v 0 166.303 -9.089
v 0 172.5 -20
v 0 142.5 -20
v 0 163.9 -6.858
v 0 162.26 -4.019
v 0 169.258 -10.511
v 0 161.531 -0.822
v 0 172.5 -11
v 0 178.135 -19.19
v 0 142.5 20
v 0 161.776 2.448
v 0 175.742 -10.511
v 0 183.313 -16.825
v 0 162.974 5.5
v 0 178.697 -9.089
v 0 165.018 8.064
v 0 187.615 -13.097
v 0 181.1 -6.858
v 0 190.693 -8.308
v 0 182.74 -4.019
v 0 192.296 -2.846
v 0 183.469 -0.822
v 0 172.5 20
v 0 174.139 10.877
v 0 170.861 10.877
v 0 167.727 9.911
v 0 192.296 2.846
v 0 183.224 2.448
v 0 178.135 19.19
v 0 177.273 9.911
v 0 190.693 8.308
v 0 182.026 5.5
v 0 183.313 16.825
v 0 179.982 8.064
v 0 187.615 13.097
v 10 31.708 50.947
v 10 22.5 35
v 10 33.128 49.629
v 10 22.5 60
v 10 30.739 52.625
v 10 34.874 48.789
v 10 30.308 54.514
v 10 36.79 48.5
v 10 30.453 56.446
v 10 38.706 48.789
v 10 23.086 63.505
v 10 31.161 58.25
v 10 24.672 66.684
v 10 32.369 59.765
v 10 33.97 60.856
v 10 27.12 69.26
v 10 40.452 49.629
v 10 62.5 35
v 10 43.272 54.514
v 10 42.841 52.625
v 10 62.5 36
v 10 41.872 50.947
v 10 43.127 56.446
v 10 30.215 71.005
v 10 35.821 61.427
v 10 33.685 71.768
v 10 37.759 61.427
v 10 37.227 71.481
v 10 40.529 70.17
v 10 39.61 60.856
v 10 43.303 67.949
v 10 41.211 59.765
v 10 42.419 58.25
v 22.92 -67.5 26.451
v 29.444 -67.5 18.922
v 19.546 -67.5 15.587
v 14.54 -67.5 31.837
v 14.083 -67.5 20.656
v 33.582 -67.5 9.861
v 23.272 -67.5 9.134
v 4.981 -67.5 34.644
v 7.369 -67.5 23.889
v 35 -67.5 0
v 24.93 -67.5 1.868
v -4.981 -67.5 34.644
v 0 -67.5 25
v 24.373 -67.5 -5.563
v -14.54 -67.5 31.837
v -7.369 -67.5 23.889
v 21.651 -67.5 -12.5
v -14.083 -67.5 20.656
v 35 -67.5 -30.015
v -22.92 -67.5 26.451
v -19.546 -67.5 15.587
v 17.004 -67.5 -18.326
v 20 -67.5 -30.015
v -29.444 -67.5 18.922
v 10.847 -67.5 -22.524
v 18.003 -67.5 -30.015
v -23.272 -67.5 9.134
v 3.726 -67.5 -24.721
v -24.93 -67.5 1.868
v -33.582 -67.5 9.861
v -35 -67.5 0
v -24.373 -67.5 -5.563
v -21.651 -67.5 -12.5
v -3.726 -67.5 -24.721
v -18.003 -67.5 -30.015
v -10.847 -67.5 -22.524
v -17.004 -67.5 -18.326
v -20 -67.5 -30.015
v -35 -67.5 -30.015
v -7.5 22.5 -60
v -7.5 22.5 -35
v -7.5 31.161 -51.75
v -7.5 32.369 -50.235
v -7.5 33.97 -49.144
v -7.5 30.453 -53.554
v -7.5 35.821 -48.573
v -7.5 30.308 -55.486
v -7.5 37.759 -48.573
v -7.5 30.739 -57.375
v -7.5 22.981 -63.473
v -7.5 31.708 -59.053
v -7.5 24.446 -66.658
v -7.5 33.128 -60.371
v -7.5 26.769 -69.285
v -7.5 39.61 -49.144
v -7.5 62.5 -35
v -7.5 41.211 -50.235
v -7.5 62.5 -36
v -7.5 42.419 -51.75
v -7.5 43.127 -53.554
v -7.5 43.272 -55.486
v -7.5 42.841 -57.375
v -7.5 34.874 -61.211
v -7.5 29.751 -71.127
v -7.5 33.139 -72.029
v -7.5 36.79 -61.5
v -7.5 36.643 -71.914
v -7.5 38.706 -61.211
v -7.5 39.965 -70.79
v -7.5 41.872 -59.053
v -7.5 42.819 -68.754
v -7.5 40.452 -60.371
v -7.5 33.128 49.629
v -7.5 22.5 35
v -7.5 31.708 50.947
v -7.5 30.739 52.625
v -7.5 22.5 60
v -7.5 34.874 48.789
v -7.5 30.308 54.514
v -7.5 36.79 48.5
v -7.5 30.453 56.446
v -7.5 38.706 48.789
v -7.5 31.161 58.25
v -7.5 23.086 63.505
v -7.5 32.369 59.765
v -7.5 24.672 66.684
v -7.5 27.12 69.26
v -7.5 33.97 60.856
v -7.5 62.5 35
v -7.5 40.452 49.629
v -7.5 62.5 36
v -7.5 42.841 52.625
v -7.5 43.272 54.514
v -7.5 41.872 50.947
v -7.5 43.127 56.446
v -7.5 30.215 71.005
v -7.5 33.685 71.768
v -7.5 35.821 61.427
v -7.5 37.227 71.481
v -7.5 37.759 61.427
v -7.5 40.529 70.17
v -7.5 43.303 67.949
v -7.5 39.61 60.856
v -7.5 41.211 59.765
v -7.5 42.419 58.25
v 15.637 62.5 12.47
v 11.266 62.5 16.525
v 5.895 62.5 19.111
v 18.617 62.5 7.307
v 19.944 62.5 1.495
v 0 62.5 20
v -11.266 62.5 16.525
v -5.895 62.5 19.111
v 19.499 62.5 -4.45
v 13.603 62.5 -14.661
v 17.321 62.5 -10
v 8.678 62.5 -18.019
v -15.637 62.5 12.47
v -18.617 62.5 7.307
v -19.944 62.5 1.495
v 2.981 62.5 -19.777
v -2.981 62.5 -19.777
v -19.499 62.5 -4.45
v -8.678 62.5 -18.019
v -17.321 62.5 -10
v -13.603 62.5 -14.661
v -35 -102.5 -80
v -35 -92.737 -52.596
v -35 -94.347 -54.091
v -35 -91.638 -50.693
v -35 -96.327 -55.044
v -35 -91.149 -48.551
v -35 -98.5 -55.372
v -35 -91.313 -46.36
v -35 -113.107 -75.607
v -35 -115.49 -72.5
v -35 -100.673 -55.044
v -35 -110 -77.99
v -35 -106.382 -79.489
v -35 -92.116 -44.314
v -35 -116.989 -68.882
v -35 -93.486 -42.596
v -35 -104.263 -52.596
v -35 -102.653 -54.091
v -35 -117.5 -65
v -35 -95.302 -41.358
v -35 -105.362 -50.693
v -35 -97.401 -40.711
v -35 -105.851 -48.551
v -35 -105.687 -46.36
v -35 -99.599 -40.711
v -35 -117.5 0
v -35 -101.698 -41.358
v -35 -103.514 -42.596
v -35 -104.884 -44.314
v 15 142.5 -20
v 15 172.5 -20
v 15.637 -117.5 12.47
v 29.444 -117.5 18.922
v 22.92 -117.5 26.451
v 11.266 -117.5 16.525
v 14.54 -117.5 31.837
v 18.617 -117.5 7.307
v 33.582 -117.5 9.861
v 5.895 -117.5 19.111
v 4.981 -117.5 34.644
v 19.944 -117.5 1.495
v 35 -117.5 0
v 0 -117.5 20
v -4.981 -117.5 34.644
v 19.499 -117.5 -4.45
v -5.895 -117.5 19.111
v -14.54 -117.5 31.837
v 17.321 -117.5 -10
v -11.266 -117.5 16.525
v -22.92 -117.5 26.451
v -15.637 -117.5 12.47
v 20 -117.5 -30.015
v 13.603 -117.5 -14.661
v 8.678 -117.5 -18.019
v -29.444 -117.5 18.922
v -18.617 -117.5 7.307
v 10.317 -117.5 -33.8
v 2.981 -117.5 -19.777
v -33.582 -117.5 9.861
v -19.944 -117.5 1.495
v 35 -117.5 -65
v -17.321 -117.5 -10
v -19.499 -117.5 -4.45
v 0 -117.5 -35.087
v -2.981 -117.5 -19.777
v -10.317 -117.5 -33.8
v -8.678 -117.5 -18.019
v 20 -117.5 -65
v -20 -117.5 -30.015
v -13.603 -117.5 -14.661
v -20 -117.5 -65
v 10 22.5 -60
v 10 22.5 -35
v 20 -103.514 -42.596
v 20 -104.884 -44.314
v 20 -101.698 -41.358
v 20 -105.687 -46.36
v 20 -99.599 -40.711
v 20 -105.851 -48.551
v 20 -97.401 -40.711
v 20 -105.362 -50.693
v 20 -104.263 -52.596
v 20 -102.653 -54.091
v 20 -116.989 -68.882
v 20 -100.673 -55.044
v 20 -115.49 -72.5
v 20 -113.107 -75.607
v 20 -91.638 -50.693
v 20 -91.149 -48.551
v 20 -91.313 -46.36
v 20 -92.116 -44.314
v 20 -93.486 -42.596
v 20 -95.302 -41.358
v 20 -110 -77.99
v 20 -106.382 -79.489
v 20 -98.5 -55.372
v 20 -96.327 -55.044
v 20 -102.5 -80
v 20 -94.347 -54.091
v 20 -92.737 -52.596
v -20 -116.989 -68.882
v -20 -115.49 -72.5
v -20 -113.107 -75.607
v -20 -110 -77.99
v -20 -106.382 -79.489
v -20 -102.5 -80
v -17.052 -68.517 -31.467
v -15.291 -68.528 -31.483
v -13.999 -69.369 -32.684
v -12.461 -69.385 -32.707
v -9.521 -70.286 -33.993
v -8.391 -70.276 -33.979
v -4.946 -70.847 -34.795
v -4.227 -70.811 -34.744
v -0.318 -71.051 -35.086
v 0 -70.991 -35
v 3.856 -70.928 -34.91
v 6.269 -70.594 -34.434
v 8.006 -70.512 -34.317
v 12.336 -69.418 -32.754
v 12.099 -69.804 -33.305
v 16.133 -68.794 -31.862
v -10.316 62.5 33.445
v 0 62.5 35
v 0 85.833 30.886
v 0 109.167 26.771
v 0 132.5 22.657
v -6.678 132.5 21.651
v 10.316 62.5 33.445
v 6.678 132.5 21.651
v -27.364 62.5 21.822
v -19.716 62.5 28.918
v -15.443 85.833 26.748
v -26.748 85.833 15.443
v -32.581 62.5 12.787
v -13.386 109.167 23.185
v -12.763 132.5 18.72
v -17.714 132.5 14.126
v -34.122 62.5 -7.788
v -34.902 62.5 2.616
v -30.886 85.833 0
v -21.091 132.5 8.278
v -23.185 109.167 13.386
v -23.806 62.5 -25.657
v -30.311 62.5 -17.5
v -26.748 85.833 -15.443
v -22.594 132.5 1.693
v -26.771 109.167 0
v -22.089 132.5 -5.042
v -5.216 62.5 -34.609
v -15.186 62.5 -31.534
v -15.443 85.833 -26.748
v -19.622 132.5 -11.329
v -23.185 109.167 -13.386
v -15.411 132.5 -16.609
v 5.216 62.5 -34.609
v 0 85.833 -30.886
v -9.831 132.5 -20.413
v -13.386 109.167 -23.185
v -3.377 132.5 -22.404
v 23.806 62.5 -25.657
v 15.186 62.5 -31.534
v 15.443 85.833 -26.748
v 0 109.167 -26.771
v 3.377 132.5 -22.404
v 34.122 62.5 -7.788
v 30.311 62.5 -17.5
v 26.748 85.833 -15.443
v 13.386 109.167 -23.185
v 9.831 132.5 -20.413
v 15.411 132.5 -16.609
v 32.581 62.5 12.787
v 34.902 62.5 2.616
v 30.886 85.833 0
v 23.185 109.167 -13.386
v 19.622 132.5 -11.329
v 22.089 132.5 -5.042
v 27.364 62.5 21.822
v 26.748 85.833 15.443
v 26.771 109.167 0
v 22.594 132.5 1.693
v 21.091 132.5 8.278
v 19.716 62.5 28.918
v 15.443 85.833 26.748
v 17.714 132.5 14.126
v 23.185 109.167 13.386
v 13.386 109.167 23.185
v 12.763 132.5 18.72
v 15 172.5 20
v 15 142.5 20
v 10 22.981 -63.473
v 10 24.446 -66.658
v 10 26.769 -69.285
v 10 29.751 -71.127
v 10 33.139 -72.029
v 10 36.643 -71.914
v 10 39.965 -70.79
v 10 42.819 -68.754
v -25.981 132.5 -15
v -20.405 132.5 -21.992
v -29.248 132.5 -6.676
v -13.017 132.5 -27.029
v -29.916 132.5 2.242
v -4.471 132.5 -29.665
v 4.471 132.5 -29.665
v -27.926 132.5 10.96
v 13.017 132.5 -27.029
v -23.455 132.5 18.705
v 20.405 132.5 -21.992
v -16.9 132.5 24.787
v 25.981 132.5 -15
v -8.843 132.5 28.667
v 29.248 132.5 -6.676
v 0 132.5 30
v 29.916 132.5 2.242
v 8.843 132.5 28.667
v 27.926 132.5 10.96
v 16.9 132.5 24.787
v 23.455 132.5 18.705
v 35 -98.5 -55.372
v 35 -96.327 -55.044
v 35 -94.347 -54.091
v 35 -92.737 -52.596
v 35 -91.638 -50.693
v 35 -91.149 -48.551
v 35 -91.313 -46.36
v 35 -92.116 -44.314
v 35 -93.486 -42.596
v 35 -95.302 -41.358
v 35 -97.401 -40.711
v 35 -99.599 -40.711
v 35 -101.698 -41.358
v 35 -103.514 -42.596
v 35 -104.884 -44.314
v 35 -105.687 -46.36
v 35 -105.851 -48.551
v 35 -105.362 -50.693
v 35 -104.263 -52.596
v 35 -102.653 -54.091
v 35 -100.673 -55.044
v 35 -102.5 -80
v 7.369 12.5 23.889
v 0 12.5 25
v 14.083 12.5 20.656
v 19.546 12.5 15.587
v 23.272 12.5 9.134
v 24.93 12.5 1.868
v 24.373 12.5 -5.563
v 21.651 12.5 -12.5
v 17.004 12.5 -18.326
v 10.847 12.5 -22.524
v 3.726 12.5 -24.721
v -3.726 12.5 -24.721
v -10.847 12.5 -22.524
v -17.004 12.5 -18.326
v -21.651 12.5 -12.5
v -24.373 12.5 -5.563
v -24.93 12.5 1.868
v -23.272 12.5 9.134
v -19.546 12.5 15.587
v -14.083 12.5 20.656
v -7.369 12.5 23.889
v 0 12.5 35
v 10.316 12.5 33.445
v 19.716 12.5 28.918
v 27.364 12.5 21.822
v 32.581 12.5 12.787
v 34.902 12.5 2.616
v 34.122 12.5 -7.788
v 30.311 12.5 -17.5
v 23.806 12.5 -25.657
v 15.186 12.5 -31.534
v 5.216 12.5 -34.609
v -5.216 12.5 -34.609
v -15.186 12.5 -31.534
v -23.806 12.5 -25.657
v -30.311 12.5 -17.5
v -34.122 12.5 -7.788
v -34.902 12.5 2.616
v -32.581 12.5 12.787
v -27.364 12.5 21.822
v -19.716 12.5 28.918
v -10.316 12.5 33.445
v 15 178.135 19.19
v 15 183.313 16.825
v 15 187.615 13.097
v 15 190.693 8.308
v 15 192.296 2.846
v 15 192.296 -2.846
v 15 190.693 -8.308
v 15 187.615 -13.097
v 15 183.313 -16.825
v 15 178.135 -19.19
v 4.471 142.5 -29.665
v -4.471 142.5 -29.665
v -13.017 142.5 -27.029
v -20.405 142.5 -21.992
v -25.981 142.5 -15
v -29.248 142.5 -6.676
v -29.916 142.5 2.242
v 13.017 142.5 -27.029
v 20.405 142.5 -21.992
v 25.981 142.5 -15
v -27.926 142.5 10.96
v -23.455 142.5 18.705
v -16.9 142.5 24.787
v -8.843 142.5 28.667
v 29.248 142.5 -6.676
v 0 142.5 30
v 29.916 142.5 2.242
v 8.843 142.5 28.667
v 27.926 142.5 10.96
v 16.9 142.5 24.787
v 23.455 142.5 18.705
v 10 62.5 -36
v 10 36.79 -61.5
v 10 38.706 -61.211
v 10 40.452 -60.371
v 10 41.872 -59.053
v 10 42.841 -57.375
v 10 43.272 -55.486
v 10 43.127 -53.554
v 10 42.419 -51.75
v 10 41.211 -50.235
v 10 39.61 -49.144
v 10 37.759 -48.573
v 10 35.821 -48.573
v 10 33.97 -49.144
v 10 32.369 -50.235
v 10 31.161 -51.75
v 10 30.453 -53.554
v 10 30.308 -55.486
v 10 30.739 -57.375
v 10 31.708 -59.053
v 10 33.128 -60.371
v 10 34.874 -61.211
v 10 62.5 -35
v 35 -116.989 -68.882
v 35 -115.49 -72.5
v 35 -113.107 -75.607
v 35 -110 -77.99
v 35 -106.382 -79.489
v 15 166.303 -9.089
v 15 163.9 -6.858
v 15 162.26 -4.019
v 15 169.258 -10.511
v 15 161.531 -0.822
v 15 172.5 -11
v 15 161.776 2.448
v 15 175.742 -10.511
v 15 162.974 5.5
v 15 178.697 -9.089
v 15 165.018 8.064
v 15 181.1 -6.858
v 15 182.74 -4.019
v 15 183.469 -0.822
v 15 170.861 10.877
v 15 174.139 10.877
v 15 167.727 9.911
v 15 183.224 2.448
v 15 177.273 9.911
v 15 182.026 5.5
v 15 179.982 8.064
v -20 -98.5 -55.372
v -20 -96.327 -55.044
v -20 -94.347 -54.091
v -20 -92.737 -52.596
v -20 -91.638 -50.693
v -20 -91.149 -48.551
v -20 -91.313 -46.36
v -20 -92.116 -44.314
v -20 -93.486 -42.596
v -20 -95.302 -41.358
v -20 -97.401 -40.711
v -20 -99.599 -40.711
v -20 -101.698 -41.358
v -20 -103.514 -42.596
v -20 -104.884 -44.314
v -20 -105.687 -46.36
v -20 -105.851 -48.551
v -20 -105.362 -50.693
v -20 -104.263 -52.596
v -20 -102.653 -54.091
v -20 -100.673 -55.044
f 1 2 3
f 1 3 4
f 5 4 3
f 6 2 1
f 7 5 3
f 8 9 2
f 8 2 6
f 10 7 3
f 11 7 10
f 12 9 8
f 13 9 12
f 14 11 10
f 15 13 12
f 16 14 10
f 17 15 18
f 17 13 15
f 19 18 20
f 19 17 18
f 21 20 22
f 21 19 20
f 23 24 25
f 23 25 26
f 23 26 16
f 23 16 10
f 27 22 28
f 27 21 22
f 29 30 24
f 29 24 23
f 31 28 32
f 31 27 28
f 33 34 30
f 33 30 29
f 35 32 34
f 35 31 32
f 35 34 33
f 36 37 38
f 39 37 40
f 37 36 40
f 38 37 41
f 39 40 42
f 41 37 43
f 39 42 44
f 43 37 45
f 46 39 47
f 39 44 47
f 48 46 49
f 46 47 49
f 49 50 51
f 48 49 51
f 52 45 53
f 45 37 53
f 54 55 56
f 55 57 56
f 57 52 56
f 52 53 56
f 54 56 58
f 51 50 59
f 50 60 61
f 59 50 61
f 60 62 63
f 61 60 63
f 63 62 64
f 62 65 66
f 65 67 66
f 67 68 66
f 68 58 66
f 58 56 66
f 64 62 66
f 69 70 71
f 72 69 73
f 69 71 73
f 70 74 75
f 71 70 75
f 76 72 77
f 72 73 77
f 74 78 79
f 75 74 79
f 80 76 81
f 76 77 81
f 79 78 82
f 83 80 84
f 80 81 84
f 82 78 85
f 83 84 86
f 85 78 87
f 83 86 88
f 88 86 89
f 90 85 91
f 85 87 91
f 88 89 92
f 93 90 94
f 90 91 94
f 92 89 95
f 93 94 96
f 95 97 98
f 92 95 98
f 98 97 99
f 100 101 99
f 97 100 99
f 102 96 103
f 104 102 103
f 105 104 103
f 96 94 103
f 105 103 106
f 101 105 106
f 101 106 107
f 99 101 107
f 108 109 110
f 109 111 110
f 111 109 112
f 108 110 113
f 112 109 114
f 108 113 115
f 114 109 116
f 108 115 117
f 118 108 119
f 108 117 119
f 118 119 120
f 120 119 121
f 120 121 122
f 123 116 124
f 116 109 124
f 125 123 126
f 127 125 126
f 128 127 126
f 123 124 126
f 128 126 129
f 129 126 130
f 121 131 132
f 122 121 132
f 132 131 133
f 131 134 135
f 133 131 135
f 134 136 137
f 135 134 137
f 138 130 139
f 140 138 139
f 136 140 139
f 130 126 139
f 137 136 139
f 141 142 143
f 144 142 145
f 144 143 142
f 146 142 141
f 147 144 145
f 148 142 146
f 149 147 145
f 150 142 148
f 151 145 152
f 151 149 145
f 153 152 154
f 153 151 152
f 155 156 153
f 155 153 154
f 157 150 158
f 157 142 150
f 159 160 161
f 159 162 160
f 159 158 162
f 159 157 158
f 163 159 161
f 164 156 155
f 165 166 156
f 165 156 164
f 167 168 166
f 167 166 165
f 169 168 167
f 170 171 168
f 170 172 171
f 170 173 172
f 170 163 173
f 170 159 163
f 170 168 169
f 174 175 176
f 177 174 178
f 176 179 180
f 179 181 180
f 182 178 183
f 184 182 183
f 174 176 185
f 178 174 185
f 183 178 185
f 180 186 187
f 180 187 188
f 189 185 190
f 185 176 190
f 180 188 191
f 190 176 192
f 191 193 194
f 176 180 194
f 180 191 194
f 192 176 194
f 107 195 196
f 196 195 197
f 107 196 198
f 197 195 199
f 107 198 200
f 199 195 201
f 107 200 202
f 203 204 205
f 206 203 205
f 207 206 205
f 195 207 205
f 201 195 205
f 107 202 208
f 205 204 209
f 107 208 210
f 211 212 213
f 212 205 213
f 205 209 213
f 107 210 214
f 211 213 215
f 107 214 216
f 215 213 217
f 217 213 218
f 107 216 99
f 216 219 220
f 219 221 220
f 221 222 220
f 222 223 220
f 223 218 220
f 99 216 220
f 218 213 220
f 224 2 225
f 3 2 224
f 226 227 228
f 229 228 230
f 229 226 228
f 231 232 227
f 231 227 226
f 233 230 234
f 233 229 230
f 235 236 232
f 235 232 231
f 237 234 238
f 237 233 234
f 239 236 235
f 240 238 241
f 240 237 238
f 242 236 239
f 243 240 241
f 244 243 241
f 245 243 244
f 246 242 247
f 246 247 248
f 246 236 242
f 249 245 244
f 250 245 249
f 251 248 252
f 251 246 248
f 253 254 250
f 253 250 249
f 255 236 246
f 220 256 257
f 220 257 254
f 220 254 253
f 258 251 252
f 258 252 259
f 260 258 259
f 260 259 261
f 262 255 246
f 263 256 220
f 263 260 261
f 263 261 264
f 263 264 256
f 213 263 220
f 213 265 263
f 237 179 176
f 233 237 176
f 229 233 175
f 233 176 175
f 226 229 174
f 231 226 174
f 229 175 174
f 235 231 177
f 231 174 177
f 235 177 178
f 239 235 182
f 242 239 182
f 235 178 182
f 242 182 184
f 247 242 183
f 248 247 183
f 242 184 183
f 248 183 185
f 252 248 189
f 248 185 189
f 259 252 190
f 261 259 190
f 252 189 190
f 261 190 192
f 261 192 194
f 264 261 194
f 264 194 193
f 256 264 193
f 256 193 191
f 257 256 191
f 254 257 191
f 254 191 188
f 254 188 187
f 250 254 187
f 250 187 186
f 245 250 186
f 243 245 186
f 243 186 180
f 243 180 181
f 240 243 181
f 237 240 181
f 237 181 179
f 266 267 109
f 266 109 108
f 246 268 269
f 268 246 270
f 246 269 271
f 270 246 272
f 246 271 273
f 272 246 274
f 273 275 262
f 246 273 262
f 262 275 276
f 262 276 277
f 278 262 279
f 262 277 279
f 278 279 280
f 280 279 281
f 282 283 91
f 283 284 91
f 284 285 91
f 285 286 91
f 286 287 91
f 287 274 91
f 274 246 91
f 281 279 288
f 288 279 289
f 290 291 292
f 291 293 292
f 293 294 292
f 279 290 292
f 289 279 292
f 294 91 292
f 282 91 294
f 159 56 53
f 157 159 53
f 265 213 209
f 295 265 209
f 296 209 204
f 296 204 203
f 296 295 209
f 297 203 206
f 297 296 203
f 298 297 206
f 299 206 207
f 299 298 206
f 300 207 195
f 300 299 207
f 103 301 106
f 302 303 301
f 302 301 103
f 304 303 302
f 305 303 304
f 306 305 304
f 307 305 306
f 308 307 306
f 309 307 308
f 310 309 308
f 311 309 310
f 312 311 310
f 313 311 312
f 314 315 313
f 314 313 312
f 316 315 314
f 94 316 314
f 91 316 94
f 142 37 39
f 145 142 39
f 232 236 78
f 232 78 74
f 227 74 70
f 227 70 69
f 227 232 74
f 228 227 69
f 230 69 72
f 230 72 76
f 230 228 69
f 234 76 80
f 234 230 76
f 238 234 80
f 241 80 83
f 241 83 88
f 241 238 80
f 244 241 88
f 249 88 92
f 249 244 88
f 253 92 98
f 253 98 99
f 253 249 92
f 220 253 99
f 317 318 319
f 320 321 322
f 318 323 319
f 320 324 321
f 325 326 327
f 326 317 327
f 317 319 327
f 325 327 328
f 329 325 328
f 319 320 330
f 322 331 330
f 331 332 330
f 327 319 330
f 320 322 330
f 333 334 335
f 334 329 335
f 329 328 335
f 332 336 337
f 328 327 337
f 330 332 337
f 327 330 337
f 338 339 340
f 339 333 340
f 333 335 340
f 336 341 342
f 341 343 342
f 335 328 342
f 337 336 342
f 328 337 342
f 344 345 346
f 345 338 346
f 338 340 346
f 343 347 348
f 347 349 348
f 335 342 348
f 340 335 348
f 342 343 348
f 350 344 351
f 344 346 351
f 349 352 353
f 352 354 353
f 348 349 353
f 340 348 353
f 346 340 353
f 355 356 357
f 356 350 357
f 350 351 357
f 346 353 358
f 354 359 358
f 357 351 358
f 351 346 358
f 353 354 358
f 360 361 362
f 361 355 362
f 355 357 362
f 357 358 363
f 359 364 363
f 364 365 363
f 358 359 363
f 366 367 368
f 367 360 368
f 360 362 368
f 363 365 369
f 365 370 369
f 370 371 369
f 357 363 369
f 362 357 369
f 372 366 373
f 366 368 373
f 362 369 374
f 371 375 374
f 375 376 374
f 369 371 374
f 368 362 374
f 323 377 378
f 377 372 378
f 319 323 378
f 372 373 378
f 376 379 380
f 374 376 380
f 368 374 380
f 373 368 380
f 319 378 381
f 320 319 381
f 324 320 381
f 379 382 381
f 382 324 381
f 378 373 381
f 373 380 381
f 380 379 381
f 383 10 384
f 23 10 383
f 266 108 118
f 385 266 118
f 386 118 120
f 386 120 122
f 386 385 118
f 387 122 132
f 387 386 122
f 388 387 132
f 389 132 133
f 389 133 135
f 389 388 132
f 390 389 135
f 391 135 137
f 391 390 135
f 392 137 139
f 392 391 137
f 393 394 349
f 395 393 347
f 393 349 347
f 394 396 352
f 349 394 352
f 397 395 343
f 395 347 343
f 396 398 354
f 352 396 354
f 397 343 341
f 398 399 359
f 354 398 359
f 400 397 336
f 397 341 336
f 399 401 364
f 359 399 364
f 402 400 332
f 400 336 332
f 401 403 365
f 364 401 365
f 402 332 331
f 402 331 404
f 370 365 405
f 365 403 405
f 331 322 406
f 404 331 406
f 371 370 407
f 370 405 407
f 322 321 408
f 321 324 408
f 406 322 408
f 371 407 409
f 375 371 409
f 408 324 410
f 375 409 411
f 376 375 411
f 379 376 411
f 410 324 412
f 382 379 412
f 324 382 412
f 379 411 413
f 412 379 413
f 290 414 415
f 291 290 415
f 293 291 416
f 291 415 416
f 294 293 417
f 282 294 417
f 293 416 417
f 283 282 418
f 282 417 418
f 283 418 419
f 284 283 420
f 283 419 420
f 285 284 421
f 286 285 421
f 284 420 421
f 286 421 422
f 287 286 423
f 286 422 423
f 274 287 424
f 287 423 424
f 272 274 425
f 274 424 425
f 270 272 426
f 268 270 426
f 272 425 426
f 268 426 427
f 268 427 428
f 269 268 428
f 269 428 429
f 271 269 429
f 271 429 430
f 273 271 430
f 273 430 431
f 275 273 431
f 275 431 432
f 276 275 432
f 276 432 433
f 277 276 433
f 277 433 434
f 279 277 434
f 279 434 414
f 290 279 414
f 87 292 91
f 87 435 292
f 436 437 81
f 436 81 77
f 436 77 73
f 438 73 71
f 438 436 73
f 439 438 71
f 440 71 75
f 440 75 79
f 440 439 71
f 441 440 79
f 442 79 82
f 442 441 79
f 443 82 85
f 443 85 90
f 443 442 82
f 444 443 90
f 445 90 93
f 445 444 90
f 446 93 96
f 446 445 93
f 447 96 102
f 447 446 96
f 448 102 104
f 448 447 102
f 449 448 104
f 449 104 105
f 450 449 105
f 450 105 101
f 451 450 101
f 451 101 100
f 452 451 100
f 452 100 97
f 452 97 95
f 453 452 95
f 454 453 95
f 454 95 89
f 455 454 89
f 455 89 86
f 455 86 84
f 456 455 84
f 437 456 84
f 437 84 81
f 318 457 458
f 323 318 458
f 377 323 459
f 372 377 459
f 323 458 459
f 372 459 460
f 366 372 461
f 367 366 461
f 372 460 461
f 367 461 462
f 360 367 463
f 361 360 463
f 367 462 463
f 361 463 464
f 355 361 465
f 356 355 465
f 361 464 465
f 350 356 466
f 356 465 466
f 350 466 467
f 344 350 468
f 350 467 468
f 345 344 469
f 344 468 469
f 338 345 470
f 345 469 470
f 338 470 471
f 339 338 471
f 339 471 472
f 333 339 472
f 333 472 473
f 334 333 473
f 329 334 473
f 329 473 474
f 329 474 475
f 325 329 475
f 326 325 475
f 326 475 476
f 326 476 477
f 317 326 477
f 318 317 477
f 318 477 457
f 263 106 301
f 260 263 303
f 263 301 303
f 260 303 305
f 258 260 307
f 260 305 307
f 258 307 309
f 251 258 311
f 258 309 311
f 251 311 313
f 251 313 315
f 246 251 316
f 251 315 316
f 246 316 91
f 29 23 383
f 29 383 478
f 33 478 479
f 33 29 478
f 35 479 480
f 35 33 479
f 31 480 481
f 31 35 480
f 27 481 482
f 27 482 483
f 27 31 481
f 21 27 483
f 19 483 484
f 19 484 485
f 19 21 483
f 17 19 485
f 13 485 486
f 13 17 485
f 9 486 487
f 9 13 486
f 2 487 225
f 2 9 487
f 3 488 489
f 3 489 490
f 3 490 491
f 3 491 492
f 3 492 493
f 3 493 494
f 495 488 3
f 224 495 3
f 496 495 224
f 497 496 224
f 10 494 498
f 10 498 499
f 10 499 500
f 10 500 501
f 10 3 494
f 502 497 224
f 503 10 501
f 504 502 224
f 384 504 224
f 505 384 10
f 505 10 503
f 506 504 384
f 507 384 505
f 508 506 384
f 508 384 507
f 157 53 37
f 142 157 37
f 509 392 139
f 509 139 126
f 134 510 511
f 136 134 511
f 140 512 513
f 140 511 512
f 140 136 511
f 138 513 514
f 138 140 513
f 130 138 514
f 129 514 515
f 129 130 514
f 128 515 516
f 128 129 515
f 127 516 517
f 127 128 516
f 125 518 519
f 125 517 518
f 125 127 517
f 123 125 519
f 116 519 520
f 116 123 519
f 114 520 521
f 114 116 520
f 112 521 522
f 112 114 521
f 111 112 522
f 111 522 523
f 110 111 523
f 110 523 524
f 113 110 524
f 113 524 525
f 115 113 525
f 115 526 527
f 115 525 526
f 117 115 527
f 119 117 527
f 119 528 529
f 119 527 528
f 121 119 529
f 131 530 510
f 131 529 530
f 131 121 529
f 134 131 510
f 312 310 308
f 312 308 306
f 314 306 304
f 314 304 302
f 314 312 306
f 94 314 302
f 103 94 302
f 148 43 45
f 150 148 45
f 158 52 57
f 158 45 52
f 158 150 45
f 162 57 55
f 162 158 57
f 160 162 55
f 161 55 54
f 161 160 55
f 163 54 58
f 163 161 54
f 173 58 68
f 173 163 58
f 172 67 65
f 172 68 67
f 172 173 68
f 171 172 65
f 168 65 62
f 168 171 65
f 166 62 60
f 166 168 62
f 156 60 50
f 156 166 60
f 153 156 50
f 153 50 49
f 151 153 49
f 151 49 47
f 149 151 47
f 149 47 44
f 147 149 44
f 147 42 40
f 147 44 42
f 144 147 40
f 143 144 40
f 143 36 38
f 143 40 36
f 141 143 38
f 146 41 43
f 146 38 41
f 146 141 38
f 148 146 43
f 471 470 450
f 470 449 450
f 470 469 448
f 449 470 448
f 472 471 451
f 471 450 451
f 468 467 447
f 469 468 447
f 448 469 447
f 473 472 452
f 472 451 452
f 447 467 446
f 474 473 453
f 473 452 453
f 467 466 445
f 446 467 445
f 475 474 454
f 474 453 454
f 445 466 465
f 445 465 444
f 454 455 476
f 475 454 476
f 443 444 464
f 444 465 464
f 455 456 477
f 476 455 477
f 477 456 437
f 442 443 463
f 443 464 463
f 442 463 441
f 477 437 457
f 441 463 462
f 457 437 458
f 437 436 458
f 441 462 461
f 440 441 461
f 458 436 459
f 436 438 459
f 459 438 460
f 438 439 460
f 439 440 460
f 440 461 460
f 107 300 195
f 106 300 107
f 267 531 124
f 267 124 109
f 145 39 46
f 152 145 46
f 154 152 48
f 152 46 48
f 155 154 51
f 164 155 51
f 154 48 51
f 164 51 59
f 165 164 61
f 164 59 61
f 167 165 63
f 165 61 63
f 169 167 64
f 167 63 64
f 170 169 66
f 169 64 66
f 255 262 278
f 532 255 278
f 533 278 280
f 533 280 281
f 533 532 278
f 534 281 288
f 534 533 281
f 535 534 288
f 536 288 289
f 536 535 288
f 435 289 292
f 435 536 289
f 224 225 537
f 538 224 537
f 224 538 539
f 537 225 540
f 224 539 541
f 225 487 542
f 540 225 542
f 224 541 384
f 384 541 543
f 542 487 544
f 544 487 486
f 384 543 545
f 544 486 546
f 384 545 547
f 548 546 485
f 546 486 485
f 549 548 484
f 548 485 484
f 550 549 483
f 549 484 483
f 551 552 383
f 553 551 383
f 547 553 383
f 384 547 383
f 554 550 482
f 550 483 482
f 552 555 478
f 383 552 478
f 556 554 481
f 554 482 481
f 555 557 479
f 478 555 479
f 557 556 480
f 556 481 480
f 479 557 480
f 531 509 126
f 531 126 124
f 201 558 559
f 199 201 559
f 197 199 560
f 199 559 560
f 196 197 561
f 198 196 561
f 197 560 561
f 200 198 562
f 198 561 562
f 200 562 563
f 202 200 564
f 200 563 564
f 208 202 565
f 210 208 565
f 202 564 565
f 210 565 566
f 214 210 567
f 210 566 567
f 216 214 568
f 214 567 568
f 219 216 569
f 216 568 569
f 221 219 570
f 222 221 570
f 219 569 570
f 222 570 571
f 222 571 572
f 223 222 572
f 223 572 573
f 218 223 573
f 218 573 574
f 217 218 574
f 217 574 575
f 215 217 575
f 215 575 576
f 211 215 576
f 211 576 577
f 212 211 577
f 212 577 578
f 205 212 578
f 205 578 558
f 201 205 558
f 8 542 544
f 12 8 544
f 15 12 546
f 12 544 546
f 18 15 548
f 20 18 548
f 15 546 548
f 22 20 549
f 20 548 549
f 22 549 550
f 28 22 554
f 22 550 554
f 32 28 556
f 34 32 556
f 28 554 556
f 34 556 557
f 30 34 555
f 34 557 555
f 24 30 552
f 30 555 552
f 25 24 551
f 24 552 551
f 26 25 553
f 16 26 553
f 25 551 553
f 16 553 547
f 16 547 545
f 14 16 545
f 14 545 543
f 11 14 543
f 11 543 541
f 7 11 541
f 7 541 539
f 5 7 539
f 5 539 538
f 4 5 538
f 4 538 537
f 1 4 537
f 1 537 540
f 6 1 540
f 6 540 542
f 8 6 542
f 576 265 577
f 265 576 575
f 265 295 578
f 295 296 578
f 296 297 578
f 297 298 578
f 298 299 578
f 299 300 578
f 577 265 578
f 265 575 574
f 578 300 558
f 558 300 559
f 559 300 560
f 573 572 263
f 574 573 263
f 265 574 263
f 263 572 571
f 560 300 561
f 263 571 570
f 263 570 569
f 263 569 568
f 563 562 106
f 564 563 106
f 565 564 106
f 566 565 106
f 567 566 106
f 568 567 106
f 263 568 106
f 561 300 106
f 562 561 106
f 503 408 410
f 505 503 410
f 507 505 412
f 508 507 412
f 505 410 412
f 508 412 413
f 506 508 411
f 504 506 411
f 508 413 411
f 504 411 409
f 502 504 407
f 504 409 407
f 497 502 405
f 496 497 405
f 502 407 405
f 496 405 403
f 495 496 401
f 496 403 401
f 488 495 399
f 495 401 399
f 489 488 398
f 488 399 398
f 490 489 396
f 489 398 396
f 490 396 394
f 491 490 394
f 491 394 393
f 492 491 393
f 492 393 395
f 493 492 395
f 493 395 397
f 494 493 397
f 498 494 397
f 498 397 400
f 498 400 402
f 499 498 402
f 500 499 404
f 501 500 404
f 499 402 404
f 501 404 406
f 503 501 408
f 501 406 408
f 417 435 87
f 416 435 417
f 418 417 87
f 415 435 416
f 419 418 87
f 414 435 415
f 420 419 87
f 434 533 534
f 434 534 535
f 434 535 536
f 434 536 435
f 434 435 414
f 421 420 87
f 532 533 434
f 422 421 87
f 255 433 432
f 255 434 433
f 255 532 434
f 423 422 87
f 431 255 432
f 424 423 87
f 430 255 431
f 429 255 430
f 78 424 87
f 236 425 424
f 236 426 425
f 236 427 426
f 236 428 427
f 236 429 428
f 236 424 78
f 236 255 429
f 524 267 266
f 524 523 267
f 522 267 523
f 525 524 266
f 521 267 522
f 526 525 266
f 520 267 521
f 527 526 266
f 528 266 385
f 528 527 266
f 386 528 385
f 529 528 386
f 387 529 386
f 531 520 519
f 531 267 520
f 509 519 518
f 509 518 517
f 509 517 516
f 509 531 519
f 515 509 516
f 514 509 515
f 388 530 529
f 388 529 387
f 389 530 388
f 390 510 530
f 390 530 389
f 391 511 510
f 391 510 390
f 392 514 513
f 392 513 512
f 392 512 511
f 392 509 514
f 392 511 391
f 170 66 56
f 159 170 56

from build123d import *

# Parameters (mm, degrees)
SKETCH1_R                = 20
BOSS_EXTRUDE1_DEPTH      = 117.5
SKETCH2_R                = 35
BOSS_EXTRUDE2_DEPTH      = 50
SKETCH3_R                = 25
BOSS_EXTRUDE3_DEPTH      = 235
SKETCH1_3_R              = 20
CUT_EXTRUDE1_DEPTH       = 117.5
BOSS_EXTRUDE4_DEPTH      = 35
CUT_EXTRUDE2_DEPTH       = 80
BOSS_EXTRUDE5_START      = -50
BOSS_EXTRUDE5_DEPTH      = 50
BOSS_EXTRUDE6_START      = -50
BOSS_EXTRUDE6_DEPTH      = 50
CUT_EXTRUDE5_DEPTH       = 205.572725455
SKETCH12_R               = 7.371760232
CUT_EXTRUDE6_DEPTH       = 159.449518775
BOSS_EXTRUDE9_START      = -105
SKETCH16_R               = 35
BOSS_EXTRUDE9_DEPTH      = 105
CUT_EXTRUDE9_START       = -55
SKETCH18_R               = 35
CUT_EXTRUDE9_DEPTH       = 55
BOSS_EXTRUDE10_START     = 55
SKETCH19_R               = 25
BOSS_EXTRUDE10_DEPTH     = 55
SKETCH20_R               = 20
CUT_EXTRUDE10_DEPTH      = 251.699022734
SKETCH57_R               = 30
BOSS_EXTRUDE11_DEPTH     = 10
BOSS_EXTRUDE13_DEPTH     = 15
SKETCH59_R               = 11
CUT_EXTRUDE11_DEPTH      = 215.374088919
BOSS_EXTRUDE20_DEPTH     = 42.5
BOSS_EXTRUDE21_DEPTH     = 42.5
CUT_EXTRUDE12_DEPTH      = 25
CUT_EXTRUDE18_START      = -25
CUT_EXTRUDE18_DEPTH      = 25
SKETCH71_W               = 21.239894534
SKETCH71_H               = 33.551769162
CUT_EXTRUDE19_DEPTH      = 25
CUT_EXTRUDE20_DEPTH      = 214.26333487
CUT_EXTRUDE20_DEPTH_BACK = 214.26333487
SKETCH72_R               = 6.5


# Read off the part's stored shape, not the designer's step: Cut-Extrude18
with BuildPart() as part:
    # Sketch1 → Boss-Extrude1 (new, symmetric)
    with BuildSketch(Plane(origin=(0, 0, 0), x_dir=(1, 0, 0), z_dir=(0, 1, 0))):
        with Locations(Location((0, 0, 0), (0, 0, 90))):
            Circle(SKETCH1_R)
    extrude(amount=BOSS_EXTRUDE1_DEPTH, both=True)

    # Sketch2 → Boss-Extrude2 (add)
    with BuildSketch(Plane.XZ.offset(117.5)):
        with Locations(Location((0, 0, 0), (0, 0, 270))):
            Circle(SKETCH2_R)
    extrude(amount=-BOSS_EXTRUDE2_DEPTH)

    # Sketch3 → Boss-Extrude3 (add)
    with BuildSketch(Plane(origin=(0, 117.5, 0), x_dir=(1, 0, 0), z_dir=(0, 1, 0))):
        with Locations(Location((0, 0, 0), (0, 0, 270))):
            Circle(SKETCH3_R)
    extrude(amount=-BOSS_EXTRUDE3_DEPTH)

    # Sketch1<3> → Cut-Extrude1 (cut, symmetric)
    with BuildSketch(Plane(origin=(0, 0, 0), x_dir=(1, 0, 0), z_dir=(0, 1, 0))):
        with Locations(Location((0, 0, 0), (0, 0, 270))):
            Circle(SKETCH1_3_R)
    extrude(amount=CUT_EXTRUDE1_DEPTH, both=True, mode=Mode.SUBTRACT)

    # Sketch4 → Boss-Extrude4 (add, symmetric)
    with BuildSketch(Plane(origin=(0, 0, 0), x_dir=(0, 0, -1), z_dir=(1, 0, 0))):
        with BuildLine():
            Line((30.014819764, -67.5), (30.014819764, -117.5))
            Line((30.014819764, -117.5), (65, -117.5))
            ThreePointArc((65, -117.5), (75.606601718, -113.106601718), (80, -102.5))
            Line((80, -102.5), (30.014819764, -67.5))
        make_face()
    extrude(amount=BOSS_EXTRUDE4_DEPTH, both=True)

    # Sketch5 → Cut-Extrude2 (cut)
    with BuildSketch(Plane(origin=(35, 0, 0), x_dir=(0, 0, -1), z_dir=(1, 0, 0))):
        Polygon((30.014819764, -67.5), (35, -67.5), (35, -70.990660781), align=None)
    extrude(amount=-CUT_EXTRUDE2_DEPTH, mode=Mode.SUBTRACT)

    # Sketch6 → Boss-Extrude5 (add)
    with BuildSketch(Plane(origin=(0, -67.5, 0), x_dir=(1, 0, 0), z_dir=(0, 1, 0)).offset(BOSS_EXTRUDE5_START)):
        with BuildLine():
            Line((-35, 30.014819764), (-35, 0))
            ThreePointArc((-35, 0), (-30.455767215, 17.246629913), (-18.003071808, 30.014819764))
            Line((-18.003071808, 30.014819764), (-35, 30.014819764))
        make_face()
    extrude(amount=BOSS_EXTRUDE5_DEPTH)

    # Sketch7 → Boss-Extrude6 (add)
    with BuildSketch(Plane(origin=(0, -67.5, 0), x_dir=(1, 0, 0), z_dir=(0, 1, 0)).offset(BOSS_EXTRUDE6_START)):
        with BuildLine():
            Line((35, 30.014819764), (35, 0))
            ThreePointArc((35, 0), (30.455767215, 17.246629913), (18.003071808, 30.014819764))
            Line((18.003071808, 30.014819764), (35, 30.014819764))
        make_face()
    extrude(amount=BOSS_EXTRUDE6_DEPTH)

    # Sketch9 → Cut-Extrude5 (cut, through all)
    with BuildSketch(Plane(origin=(0, -67.5, 0), x_dir=(1, 0, 0), z_dir=(0, 1, 0))):
        with BuildLine():
            Line((0, 80), (-20, 80))
            Line((-20, 80), (-20, 30.014819764))
            ThreePointArc((-20, 30.014819764), (0, 35.08744218), (20, 30.014819764))
            Line((20, 30.014819764), (20, 80))
            Line((20, 80), (0, 80))
        make_face()
    extrude(amount=-CUT_EXTRUDE5_DEPTH, mode=Mode.SUBTRACT)

    # Sketch12 → Cut-Extrude6 (cut, through all)
    with BuildSketch(Plane(origin=(35, 0, 0), x_dir=(0, 0, -1), z_dir=(1, 0, 0))):
        with Locations((48, -98.5)):
            Circle(SKETCH12_R)
    extrude(amount=-CUT_EXTRUDE6_DEPTH, mode=Mode.SUBTRACT)

    # Sketch16 → Boss-Extrude9 (add)
    with BuildSketch(Plane(origin=(0, 117.5, 0), x_dir=(1, 0, 0), z_dir=(0, 1, 0)).offset(BOSS_EXTRUDE9_START)):
        with Locations(Location((0, 0, 0), (0, 0, 270))):
            Circle(SKETCH16_R)
    extrude(amount=BOSS_EXTRUDE9_DEPTH)

    # Sketch18 → Cut-Extrude9 (cut)
    with BuildSketch(Plane(origin=(0, 117.5, 0), x_dir=(1, 0, 0), z_dir=(0, 1, 0)).offset(CUT_EXTRUDE9_START)):
        with Locations(Location((0, 0, 0), (0, 0, 270))):
            Circle(SKETCH18_R)
    extrude(amount=CUT_EXTRUDE9_DEPTH, mode=Mode.SUBTRACT)

    # Sketch19 → Boss-Extrude10 (add)
    with BuildSketch(Plane(origin=(0, 62.5, 0), x_dir=(1, 0, 0), z_dir=(0, 1, 0)).offset(BOSS_EXTRUDE10_START)):
        with Locations(Location((0, 0, 0), (0, 0, 270))):
            Circle(SKETCH19_R)
    extrude(amount=-BOSS_EXTRUDE10_DEPTH)

    # Sketch20 → Cut-Extrude10 (cut, through all)
    with BuildSketch(Plane(origin=(0, 117.5, 0), x_dir=(1, 0, 0), z_dir=(0, 1, 0))):
        with Locations(Location((0, 0, 0), (0, 0, 270))):
            Circle(SKETCH20_R)
    extrude(amount=-CUT_EXTRUDE10_DEPTH, mode=Mode.SUBTRACT)

    # Sketch21 → Revolve1 (revolve)
    with BuildSketch(Plane(origin=(0, 0, 0), x_dir=(0, 0, -1), z_dir=(1, 0, 0))):
        Polygon((-35, 62.5), (-22.65711135, 132.5), (0, 132.5), (0, 62.5), align=None)
    revolve(axis=Axis((0, 132.5, 0), (0, -1, 0)))

    # Sketch57 → Boss-Extrude11 (add)
    with BuildSketch(Plane(origin=(0, 132.5, 0), x_dir=(1, 0, 0), z_dir=(0, 1, 0))):
        with Locations(Location((0, 0, 0), (0, 0, 270))):
            Circle(SKETCH57_R)
    extrude(amount=BOSS_EXTRUDE11_DEPTH)

    # Sketch58 → Boss-Extrude13 (add)
    with BuildSketch(Plane(origin=(0, 0, 0), x_dir=(0, 0, -1), z_dir=(1, 0, 0))):
        with BuildLine():
            Line((0, 142.5), (-20, 142.5))
            Line((-20, 142.5), (-20, 172.5))
            ThreePointArc((-20, 172.5), (0, 192.5), (20, 172.5))
            Line((20, 172.5), (20, 142.5))
            Line((20, 142.5), (0, 142.5))
        make_face()
    extrude(amount=BOSS_EXTRUDE13_DEPTH)

    # Sketch59 → Cut-Extrude11 (cut, through all)
    with BuildSketch(Plane(origin=(15, 0, 0), x_dir=(0, 0, -1), z_dir=(1, 0, 0))):
        with Locations((0, 172.5)):
            Circle(SKETCH59_R)
    extrude(amount=-CUT_EXTRUDE11_DEPTH, mode=Mode.SUBTRACT)


with BuildPart() as body_2:
    # Sketch61 → Boss-Extrude20 (new body)
    with BuildSketch(Plane(origin=(35, 0, 0), x_dir=(0, 0, -1), z_dir=(1, 0, 0))):
        with BuildLine():
            Line((-35, 22.5), (-60, 22.5))
            ThreePointArc((-60, 22.5), (-71.005339309, 30.215016925), (-67.94901172, 43.303097041))
            Line((-67.94901172, 43.303097041), (-36, 62.5))
            Line((-36, 62.5), (-35, 62.5))
            Line((-35, 62.5), (-35, 22.5))
        make_face()
    extrude(amount=-BOSS_EXTRUDE20_DEPTH)

    # Sketch66 → Cut-Extrude12 (cut)
    with BuildSketch(Plane(origin=(35, 0, 0), x_dir=(0, 0, -1), z_dir=(1, 0, 0))):
        with BuildLine():
            Line((-35, 22.5), (-60, 22.5))
            ThreePointArc((-60, 22.5), (-71.005339309, 30.215016925), (-67.94901172, 43.303097041))
            Line((-67.94901172, 43.303097041), (-36, 62.5))
            Line((-36, 62.5), (-35, 62.5))
            Line((-35, 62.5), (-35, 22.5))
        make_face()
    extrude(amount=-CUT_EXTRUDE12_DEPTH, mode=Mode.SUBTRACT)


with BuildPart() as body_3:
    # Sketch65 → Boss-Extrude21 (new body)
    with BuildSketch(Plane(origin=(35, 0, 0), x_dir=(0, 0, -1), z_dir=(1, 0, 0))):
        with BuildLine():
            Line((35, 22.5), (60, 22.5))
            ThreePointArc((60, 22.5), (71.127309171, 29.751326397), (68.754425185, 42.819155807))
            Line((68.754425185, 42.819155807), (36, 62.5))
            Line((36, 62.5), (35, 62.5))
            Line((35, 62.5), (35, 22.5))
        make_face()
    extrude(amount=-BOSS_EXTRUDE21_DEPTH)

    # Cut-Extrude18 outline → Cut-Extrude18 (cut)
    with BuildSketch(Plane(origin=(35, 0, 0), x_dir=(0, 0, -1), z_dir=(1, 0, 0)).offset(CUT_EXTRUDE18_START)):
        with BuildLine():
            ThreePointArc((60, 22.5), (71.062414441, 29.779286026), (68.754425185, 42.819155807))
            Line((68.754425185, 42.819155807), (36, 62.5))
            Line((36, 62.5), (35, 62.5))
            Line((35, 62.5), (35, 22.5))
            Line((35, 22.5), (60, 22.5))
        make_face()
    extrude(amount=CUT_EXTRUDE18_DEPTH, mode=Mode.SUBTRACT)

    # Sketch71 → Cut-Extrude19 (cut)
    with BuildSketch(Plane(origin=(10, 0, 0), x_dir=(0, 0, -1), z_dir=(1, 0, 0))):
        with Locations((67.690155939, 35.883693323)):
            Rectangle(SKETCH71_W, SKETCH71_H)
    extrude(amount=CUT_EXTRUDE19_DEPTH, mode=Mode.SUBTRACT)


with BuildPart() as cut_extrude20_tool:
    # Sketch72 → Cut-Extrude20 (new, two sides: drawn at the far end of the back side and taken through both)
    with BuildSketch(Plane(origin=(10, 0, 0), x_dir=(0, 0, -1), z_dir=(1, 0, 0)).offset(-CUT_EXTRUDE20_DEPTH_BACK)):
        with Locations((-55, 36.79)):
            Circle(SKETCH72_R)
        with Locations((55, 36.79)):
            Circle(SKETCH72_R)
    extrude(amount=CUT_EXTRUDE20_DEPTH + CUT_EXTRUDE20_DEPTH_BACK)


with BuildPart() as body_2_1:
    add(body_2.part)

    # Cut-Extrude20: cut by cut_extrude20_tool
    add(cut_extrude20_tool.part, mode=Mode.SUBTRACT)


with BuildPart() as body_3_1:
    add(body_3.part)

    # Cut-Extrude20: cut by cut_extrude20_tool
    add(cut_extrude20_tool.part, mode=Mode.SUBTRACT)


solid = Compound([part.part, body_2_1.part, body_3_1.part])
